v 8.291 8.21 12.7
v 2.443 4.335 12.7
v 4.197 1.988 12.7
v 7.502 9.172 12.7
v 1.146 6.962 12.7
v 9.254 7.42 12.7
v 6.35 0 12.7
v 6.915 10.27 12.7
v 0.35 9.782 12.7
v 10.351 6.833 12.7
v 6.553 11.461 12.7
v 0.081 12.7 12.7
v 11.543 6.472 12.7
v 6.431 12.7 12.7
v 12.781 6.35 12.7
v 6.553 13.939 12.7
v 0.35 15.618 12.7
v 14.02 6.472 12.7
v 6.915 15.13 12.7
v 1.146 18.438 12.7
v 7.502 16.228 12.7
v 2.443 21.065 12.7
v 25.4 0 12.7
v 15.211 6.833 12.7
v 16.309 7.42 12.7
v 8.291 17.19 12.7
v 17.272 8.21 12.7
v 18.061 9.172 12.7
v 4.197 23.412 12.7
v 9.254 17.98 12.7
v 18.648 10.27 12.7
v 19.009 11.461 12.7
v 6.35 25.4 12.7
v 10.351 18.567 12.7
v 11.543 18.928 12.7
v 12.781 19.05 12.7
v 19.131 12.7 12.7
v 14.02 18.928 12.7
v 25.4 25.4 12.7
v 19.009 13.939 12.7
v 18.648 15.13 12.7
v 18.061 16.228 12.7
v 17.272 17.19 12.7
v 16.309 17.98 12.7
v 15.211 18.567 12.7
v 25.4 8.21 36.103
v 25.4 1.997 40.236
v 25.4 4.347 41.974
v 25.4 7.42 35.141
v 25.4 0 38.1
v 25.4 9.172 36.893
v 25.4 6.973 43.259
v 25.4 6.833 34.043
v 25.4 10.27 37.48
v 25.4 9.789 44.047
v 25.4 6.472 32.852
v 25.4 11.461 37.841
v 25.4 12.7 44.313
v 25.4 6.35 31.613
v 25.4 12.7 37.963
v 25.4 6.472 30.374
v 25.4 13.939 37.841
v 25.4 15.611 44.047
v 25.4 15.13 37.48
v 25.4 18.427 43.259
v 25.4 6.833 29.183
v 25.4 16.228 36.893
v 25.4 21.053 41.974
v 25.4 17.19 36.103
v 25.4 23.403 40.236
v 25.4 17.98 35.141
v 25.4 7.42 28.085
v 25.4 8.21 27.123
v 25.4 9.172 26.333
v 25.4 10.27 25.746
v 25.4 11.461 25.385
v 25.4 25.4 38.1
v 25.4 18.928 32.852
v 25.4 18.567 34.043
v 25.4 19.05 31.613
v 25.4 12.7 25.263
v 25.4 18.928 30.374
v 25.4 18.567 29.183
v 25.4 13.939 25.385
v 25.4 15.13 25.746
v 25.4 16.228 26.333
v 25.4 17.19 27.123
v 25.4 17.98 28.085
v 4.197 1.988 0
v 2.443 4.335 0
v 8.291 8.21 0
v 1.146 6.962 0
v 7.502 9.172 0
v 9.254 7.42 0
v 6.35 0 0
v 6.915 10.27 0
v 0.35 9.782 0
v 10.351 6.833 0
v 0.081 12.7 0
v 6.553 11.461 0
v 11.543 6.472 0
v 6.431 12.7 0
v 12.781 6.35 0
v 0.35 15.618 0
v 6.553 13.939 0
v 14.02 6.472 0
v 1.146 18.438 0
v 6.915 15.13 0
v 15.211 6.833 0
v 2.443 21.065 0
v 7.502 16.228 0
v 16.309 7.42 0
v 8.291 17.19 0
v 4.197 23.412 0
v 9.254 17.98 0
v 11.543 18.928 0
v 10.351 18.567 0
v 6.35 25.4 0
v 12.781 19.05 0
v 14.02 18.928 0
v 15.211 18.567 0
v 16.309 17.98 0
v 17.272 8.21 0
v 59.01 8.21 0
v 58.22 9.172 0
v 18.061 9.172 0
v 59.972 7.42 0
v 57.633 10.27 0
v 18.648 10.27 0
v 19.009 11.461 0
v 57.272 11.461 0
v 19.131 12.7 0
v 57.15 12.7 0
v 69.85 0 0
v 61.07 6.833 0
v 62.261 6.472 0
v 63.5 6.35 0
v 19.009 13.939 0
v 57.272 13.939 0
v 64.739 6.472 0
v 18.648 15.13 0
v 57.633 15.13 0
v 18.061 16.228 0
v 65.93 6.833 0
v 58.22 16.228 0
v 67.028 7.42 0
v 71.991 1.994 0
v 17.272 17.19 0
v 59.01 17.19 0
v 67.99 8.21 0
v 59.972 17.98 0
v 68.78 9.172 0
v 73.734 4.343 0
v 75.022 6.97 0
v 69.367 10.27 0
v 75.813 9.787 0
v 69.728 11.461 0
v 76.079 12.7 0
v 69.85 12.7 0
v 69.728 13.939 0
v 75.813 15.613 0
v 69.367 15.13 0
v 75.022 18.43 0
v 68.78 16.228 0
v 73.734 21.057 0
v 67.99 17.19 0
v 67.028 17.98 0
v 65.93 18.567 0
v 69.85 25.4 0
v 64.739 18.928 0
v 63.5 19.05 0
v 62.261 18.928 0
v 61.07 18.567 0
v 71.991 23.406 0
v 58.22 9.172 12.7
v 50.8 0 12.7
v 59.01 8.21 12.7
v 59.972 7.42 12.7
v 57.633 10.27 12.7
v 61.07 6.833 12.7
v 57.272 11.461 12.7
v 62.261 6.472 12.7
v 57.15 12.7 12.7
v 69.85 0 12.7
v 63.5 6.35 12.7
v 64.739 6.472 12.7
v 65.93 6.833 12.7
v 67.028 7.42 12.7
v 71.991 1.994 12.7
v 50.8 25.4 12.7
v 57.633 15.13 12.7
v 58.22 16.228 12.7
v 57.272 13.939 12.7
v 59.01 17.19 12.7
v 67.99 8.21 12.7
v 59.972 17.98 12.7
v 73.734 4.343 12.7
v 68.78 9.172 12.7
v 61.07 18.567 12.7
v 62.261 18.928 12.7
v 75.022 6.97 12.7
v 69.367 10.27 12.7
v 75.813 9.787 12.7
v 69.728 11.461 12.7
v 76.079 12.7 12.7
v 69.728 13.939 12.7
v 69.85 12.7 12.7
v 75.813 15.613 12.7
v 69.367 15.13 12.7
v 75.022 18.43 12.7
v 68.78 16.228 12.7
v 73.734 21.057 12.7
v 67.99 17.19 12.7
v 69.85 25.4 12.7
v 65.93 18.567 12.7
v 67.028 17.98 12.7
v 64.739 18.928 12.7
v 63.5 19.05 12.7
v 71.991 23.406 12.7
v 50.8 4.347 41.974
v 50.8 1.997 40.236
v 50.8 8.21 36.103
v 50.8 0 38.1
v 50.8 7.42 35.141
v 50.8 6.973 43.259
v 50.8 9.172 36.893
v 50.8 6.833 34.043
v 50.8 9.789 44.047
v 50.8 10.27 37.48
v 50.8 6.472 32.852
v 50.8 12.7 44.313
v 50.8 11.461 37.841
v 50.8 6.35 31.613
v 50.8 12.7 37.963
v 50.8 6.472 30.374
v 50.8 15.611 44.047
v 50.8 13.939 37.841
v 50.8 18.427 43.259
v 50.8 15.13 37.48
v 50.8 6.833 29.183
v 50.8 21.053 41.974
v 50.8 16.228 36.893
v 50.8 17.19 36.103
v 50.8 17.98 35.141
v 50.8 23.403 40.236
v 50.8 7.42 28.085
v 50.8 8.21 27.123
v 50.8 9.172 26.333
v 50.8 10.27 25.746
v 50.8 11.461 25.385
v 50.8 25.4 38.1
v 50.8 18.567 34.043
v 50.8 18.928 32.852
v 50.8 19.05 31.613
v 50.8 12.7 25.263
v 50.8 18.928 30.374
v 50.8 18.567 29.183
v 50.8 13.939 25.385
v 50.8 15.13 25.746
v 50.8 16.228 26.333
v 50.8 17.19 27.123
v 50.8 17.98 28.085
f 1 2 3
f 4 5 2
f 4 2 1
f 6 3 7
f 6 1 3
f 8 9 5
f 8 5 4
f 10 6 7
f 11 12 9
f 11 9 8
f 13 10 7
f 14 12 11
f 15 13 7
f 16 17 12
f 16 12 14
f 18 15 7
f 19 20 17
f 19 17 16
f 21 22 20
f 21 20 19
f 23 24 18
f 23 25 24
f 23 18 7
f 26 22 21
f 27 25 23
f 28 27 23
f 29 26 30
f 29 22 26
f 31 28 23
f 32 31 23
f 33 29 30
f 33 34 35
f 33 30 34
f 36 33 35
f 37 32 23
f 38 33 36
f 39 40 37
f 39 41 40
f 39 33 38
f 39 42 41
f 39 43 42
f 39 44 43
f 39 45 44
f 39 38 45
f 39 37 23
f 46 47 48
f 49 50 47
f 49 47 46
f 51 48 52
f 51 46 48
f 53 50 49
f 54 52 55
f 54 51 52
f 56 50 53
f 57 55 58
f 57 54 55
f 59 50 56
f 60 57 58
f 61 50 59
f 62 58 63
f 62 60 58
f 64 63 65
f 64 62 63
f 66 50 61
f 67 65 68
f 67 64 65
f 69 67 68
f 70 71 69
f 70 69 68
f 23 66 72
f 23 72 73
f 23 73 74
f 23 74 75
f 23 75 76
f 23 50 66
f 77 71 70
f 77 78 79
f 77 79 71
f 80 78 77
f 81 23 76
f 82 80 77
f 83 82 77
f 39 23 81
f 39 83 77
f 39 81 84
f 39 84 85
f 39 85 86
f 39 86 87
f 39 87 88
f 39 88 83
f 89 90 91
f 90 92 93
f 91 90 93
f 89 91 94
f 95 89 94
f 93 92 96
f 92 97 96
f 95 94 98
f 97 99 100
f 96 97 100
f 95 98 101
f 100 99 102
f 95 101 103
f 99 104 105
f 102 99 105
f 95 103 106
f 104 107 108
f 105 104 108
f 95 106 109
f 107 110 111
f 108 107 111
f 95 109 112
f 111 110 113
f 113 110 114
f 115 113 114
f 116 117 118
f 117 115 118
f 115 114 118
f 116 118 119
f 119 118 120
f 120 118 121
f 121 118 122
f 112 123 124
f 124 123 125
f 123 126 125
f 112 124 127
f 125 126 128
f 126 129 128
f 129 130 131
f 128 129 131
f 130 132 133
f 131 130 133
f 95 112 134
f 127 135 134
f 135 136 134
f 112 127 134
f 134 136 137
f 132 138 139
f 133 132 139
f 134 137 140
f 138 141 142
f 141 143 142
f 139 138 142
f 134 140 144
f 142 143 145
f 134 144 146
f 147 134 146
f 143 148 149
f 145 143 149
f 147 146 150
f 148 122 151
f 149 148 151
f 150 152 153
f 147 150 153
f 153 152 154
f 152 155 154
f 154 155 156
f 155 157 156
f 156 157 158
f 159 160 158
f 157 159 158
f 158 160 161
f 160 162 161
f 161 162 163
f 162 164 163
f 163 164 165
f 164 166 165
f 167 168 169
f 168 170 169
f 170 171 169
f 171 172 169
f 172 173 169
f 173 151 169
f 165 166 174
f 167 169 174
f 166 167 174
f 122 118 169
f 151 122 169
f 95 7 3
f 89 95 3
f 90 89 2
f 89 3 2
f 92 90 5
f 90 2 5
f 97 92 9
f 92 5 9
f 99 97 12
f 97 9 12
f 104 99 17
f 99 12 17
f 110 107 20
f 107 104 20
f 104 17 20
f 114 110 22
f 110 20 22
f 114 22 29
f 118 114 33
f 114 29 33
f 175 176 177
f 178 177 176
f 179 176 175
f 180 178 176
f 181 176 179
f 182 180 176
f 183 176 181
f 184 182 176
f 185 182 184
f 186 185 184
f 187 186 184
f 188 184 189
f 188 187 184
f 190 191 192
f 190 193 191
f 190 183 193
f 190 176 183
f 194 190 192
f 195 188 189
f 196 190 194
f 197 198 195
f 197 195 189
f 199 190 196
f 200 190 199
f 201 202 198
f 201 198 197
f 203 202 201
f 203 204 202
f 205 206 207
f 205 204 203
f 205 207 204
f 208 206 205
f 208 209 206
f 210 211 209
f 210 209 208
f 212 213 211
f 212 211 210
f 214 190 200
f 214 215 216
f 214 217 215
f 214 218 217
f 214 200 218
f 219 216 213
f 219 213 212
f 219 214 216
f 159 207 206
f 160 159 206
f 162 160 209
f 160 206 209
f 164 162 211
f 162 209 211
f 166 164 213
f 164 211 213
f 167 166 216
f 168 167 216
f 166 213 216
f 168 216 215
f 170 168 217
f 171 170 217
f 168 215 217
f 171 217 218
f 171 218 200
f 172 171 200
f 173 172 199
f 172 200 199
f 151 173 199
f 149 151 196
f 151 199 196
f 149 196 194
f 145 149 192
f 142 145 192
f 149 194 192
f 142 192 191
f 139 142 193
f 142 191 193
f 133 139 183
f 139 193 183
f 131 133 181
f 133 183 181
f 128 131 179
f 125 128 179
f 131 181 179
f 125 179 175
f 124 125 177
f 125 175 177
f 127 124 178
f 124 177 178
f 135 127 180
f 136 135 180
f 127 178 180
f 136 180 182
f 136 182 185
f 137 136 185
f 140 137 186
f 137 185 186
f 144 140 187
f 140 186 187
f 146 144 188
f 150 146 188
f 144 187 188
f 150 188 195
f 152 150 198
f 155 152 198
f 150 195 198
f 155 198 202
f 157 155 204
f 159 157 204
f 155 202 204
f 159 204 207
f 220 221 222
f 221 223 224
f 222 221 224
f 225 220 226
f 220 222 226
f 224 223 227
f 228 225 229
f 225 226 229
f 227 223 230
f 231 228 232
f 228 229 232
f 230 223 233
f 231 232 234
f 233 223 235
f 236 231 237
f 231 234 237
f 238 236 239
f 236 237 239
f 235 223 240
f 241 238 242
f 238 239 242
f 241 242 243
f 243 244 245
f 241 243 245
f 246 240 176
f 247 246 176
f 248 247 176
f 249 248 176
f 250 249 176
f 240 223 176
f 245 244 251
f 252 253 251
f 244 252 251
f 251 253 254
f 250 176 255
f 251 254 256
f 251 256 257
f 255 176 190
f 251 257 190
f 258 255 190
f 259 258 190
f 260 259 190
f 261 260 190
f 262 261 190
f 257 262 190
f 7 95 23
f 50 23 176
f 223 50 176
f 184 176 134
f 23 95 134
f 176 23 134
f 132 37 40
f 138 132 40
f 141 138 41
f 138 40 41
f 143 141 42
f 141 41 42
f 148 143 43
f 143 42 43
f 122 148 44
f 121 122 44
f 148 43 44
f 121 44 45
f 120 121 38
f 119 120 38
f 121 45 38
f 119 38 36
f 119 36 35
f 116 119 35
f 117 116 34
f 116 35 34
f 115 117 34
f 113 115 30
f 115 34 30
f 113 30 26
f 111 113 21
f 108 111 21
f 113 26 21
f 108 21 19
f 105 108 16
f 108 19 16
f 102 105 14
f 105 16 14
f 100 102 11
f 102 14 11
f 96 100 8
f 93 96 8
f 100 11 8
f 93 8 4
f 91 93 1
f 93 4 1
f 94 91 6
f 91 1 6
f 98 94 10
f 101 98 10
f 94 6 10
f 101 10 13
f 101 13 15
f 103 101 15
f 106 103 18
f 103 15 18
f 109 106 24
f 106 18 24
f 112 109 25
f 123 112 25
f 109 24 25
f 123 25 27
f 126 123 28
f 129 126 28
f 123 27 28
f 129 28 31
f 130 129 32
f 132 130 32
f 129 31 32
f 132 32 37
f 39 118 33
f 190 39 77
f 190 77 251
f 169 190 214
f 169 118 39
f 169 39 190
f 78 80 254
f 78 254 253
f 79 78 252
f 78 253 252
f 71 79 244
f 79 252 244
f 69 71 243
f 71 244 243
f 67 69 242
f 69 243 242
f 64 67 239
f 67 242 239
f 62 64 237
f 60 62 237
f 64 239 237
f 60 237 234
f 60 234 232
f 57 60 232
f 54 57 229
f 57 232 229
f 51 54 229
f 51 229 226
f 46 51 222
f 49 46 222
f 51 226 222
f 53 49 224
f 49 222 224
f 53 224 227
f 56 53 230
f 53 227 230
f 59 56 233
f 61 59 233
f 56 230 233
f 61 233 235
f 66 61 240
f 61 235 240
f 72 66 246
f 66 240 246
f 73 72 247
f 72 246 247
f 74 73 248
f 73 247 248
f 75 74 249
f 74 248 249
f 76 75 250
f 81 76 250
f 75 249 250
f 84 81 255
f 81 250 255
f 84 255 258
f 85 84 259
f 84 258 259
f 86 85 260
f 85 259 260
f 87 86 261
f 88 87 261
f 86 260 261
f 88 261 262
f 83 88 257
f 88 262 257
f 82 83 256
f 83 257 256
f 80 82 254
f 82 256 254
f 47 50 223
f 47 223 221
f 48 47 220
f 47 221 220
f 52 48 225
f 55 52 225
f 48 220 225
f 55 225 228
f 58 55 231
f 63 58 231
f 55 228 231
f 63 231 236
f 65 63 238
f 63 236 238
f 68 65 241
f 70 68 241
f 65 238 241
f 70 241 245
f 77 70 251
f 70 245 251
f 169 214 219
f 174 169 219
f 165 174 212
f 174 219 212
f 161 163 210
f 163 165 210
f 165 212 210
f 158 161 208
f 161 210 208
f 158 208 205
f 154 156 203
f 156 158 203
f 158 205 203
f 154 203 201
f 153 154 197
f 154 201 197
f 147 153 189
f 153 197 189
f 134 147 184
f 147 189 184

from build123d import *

# Parameters (mm, degrees)
F0_W      = 76.2
F0_H      = 25.4
F1_DEPTH  = 12.7
F3_DEPTH  = 25.4
F4_W      = 25.4
F4_H      = 25.4
F5_DEPTH  = 31.75
F7_DEPTH  = 25.4
F8_R      = 6.35
F9_DEPTH  = 12.7
F10_R     = 6.35
F11_DEPTH = 25.4


with BuildPart() as f1:
    # F0 (on Top) → F1 (new body)
    with BuildSketch(Plane.XY):
        with Locations((38.1, 12.7)):
            Rectangle(F0_W, F0_H)
    extrude(amount=F1_DEPTH)

    # F2 (on face) → F3 (cut)
    with BuildSketch(Plane.XY.offset(12.7)):
        with BuildLine():
            ThreePointArc((6.35, 0), (0.081424, 12.7), (6.35, 25.4))
            Line((6.35, 25.4), (0, 25.4))
            Line((0, 25.4), (0, 0))
            Line((0, 0), (6.35, 0))
        make_face()
        with BuildLine():
            Line((76.2, 25.4), (69.85, 25.4))
            ThreePointArc((69.85, 25.4), (76.079165, 12.7), (69.85, 0))
            Line((69.85, 0), (76.2, 0))
            Line((76.2, 0), (76.2, 25.4))
        make_face()
    extrude(amount=-F3_DEPTH, mode=Mode.SUBTRACT)

    # F4 (on face) → F5 (join)
    with BuildSketch(Plane.XY.offset(12.7)):
        with Locations((38.1, 12.7)):
            Rectangle(F4_W, F4_H)
    extrude(amount=F5_DEPTH)

    # F6 (on face) → F7 (cut)
    with BuildSketch(Plane.YZ.offset(50.8)):
        with BuildLine():
            Line((0, 44.45), (0, 38.1))
            ThreePointArc((0, 38.1), (12.7, 44.313005), (25.4, 38.1))
            Line((25.4, 38.1), (25.4, 44.45))
            Line((25.4, 44.45), (0, 44.45))
        make_face()
    extrude(amount=-F7_DEPTH, mode=Mode.SUBTRACT)

    # F8 (on face) → F9 (cut)
    with BuildSketch(Plane.XY.offset(12.7)):
        with Locations((12.781424, 12.7)):
            Circle(F8_R)
        with Locations((63.5, 12.7)):
            Circle(F8_R)
    extrude(amount=-F9_DEPTH, mode=Mode.SUBTRACT)

    # F10 (on face) → F11 (cut)
    with BuildSketch(Plane.YZ.offset(50.8)):
        with Locations((12.7, 31.613005)):
            Circle(F10_R)
    extrude(amount=-F11_DEPTH, mode=Mode.SUBTRACT)


solid = f1.part
